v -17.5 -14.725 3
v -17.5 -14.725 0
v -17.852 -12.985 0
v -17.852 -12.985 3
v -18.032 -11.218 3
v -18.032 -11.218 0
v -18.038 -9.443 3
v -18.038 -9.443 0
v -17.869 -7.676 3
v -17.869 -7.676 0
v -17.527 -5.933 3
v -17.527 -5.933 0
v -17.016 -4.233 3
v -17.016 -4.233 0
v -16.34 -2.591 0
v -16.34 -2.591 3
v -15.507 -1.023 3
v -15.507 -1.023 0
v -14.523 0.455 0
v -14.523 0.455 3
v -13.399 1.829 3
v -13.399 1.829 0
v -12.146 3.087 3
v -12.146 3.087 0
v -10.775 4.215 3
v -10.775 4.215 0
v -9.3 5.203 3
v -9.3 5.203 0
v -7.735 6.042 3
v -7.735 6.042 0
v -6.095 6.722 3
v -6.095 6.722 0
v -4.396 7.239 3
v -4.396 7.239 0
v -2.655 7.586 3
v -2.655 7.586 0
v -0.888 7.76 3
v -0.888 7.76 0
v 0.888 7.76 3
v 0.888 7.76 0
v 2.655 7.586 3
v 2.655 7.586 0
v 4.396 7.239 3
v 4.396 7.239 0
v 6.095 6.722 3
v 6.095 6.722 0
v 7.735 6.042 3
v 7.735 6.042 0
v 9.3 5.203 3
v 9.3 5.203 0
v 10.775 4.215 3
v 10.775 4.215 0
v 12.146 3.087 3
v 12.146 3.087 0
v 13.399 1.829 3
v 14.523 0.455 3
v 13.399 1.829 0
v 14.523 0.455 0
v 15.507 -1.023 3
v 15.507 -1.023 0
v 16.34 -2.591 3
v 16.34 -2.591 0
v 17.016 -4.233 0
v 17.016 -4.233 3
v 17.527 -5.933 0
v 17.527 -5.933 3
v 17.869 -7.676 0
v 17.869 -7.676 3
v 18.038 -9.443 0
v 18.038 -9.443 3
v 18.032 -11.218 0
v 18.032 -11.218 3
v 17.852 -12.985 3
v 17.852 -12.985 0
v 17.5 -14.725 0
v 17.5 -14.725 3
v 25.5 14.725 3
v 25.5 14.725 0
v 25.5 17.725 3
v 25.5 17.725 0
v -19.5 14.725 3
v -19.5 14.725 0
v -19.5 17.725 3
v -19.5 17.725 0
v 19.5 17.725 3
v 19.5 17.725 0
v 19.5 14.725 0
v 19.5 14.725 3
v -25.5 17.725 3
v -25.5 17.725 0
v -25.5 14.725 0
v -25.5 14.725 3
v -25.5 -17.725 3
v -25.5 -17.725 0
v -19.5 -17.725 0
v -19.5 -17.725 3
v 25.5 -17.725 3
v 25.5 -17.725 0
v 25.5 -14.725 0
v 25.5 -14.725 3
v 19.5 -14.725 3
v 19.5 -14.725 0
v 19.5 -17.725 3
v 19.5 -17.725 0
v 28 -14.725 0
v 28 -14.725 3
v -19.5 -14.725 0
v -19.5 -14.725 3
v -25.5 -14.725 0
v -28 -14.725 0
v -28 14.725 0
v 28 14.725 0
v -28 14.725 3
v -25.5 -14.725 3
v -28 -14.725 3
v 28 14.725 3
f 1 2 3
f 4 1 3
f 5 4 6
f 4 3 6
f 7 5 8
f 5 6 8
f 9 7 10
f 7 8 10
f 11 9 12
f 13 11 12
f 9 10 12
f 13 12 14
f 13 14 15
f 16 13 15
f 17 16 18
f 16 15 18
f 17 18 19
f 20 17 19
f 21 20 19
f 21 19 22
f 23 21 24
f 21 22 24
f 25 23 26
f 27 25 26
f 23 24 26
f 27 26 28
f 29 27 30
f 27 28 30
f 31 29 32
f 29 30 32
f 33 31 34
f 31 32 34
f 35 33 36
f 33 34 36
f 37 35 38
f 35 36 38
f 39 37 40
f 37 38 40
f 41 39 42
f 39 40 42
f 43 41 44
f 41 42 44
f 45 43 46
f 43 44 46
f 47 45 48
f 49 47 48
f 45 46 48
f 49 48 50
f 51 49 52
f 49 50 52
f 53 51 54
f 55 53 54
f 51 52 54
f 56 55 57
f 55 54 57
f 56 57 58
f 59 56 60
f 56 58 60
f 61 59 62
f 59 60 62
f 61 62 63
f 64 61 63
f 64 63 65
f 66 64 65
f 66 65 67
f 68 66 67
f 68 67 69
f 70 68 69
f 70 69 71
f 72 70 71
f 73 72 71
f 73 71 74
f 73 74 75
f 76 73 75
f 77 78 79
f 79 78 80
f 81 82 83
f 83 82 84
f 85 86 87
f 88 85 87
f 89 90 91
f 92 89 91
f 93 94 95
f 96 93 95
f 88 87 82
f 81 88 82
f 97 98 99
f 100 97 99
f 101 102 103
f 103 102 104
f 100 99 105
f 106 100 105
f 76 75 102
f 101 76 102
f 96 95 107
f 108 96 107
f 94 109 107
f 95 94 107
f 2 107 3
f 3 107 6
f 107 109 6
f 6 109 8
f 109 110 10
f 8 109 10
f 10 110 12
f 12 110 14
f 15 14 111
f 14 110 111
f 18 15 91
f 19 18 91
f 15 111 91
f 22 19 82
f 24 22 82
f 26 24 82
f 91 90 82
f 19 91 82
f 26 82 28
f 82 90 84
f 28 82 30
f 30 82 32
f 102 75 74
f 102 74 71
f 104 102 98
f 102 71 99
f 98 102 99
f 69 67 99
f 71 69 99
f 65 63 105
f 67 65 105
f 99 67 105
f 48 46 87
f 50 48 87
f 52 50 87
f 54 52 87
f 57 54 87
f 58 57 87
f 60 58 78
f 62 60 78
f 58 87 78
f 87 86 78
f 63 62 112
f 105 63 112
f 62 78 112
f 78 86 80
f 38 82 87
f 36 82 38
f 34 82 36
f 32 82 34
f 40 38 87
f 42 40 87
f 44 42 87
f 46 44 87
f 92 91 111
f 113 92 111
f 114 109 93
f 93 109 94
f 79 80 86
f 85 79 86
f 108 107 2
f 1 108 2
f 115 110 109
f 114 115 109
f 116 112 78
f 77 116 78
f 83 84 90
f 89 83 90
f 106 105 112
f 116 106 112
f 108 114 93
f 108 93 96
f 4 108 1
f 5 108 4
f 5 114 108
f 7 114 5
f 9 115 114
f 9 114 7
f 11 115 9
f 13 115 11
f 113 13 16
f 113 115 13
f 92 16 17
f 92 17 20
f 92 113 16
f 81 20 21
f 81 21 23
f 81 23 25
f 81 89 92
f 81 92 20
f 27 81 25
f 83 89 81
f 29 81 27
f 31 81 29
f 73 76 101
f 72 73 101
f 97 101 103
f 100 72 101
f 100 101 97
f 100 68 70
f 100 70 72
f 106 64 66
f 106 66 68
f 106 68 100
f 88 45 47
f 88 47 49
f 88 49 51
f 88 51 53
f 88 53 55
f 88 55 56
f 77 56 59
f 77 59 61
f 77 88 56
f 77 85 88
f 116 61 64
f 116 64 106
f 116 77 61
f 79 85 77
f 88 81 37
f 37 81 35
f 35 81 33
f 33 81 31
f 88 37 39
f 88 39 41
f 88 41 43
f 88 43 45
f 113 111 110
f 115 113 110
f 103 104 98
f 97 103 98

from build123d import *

# Parameters (mm, degrees)
BOSS_EXTRUDE1_DEPTH = 3


with BuildPart() as part:
    # Sketch1 → Boss-Extrude1 (new body)
    with BuildSketch(Plane.XY):
        with BuildLine():
            Line((-28, 14.725), (-28, -14.725))
            Line((-28, -14.725), (-25.5, -14.725))
            Line((-25.5, -14.725), (-25.5, -17.725))
            Line((-25.5, -17.725), (-19.5, -17.725))
            Line((-19.5, -17.725), (-19.5, -14.725))
            Line((-19.5, -14.725), (-17.5, -14.725))
            ThreePointArc((-17.5, -14.725), (0, 7.78192388), (17.5, -14.725))
            Line((17.5, -14.725), (19.5, -14.725))
            Line((19.5, -14.725), (19.5, -17.725))
            Line((19.5, -17.725), (25.5, -17.725))
            Line((25.5, -17.725), (25.5, -14.725))
            Line((25.5, -14.725), (28, -14.725))
            Line((28, -14.725), (28, 14.725))
            Line((28, 14.725), (25.5, 14.725))
            Line((25.5, 14.725), (25.5, 17.725))
            Line((25.5, 17.725), (19.5, 17.725))
            Line((19.5, 17.725), (19.5, 14.725))
            Line((19.5, 14.725), (-19.5, 14.725))
            Line((-19.5, 14.725), (-19.5, 17.725))
            Line((-19.5, 17.725), (-25.5, 17.725))
            Line((-25.5, 17.725), (-25.5, 14.725))
            Line((-25.5, 14.725), (-28, 14.725))
        make_face()
    extrude(amount=BOSS_EXTRUDE1_DEPTH)


solid = part.part
